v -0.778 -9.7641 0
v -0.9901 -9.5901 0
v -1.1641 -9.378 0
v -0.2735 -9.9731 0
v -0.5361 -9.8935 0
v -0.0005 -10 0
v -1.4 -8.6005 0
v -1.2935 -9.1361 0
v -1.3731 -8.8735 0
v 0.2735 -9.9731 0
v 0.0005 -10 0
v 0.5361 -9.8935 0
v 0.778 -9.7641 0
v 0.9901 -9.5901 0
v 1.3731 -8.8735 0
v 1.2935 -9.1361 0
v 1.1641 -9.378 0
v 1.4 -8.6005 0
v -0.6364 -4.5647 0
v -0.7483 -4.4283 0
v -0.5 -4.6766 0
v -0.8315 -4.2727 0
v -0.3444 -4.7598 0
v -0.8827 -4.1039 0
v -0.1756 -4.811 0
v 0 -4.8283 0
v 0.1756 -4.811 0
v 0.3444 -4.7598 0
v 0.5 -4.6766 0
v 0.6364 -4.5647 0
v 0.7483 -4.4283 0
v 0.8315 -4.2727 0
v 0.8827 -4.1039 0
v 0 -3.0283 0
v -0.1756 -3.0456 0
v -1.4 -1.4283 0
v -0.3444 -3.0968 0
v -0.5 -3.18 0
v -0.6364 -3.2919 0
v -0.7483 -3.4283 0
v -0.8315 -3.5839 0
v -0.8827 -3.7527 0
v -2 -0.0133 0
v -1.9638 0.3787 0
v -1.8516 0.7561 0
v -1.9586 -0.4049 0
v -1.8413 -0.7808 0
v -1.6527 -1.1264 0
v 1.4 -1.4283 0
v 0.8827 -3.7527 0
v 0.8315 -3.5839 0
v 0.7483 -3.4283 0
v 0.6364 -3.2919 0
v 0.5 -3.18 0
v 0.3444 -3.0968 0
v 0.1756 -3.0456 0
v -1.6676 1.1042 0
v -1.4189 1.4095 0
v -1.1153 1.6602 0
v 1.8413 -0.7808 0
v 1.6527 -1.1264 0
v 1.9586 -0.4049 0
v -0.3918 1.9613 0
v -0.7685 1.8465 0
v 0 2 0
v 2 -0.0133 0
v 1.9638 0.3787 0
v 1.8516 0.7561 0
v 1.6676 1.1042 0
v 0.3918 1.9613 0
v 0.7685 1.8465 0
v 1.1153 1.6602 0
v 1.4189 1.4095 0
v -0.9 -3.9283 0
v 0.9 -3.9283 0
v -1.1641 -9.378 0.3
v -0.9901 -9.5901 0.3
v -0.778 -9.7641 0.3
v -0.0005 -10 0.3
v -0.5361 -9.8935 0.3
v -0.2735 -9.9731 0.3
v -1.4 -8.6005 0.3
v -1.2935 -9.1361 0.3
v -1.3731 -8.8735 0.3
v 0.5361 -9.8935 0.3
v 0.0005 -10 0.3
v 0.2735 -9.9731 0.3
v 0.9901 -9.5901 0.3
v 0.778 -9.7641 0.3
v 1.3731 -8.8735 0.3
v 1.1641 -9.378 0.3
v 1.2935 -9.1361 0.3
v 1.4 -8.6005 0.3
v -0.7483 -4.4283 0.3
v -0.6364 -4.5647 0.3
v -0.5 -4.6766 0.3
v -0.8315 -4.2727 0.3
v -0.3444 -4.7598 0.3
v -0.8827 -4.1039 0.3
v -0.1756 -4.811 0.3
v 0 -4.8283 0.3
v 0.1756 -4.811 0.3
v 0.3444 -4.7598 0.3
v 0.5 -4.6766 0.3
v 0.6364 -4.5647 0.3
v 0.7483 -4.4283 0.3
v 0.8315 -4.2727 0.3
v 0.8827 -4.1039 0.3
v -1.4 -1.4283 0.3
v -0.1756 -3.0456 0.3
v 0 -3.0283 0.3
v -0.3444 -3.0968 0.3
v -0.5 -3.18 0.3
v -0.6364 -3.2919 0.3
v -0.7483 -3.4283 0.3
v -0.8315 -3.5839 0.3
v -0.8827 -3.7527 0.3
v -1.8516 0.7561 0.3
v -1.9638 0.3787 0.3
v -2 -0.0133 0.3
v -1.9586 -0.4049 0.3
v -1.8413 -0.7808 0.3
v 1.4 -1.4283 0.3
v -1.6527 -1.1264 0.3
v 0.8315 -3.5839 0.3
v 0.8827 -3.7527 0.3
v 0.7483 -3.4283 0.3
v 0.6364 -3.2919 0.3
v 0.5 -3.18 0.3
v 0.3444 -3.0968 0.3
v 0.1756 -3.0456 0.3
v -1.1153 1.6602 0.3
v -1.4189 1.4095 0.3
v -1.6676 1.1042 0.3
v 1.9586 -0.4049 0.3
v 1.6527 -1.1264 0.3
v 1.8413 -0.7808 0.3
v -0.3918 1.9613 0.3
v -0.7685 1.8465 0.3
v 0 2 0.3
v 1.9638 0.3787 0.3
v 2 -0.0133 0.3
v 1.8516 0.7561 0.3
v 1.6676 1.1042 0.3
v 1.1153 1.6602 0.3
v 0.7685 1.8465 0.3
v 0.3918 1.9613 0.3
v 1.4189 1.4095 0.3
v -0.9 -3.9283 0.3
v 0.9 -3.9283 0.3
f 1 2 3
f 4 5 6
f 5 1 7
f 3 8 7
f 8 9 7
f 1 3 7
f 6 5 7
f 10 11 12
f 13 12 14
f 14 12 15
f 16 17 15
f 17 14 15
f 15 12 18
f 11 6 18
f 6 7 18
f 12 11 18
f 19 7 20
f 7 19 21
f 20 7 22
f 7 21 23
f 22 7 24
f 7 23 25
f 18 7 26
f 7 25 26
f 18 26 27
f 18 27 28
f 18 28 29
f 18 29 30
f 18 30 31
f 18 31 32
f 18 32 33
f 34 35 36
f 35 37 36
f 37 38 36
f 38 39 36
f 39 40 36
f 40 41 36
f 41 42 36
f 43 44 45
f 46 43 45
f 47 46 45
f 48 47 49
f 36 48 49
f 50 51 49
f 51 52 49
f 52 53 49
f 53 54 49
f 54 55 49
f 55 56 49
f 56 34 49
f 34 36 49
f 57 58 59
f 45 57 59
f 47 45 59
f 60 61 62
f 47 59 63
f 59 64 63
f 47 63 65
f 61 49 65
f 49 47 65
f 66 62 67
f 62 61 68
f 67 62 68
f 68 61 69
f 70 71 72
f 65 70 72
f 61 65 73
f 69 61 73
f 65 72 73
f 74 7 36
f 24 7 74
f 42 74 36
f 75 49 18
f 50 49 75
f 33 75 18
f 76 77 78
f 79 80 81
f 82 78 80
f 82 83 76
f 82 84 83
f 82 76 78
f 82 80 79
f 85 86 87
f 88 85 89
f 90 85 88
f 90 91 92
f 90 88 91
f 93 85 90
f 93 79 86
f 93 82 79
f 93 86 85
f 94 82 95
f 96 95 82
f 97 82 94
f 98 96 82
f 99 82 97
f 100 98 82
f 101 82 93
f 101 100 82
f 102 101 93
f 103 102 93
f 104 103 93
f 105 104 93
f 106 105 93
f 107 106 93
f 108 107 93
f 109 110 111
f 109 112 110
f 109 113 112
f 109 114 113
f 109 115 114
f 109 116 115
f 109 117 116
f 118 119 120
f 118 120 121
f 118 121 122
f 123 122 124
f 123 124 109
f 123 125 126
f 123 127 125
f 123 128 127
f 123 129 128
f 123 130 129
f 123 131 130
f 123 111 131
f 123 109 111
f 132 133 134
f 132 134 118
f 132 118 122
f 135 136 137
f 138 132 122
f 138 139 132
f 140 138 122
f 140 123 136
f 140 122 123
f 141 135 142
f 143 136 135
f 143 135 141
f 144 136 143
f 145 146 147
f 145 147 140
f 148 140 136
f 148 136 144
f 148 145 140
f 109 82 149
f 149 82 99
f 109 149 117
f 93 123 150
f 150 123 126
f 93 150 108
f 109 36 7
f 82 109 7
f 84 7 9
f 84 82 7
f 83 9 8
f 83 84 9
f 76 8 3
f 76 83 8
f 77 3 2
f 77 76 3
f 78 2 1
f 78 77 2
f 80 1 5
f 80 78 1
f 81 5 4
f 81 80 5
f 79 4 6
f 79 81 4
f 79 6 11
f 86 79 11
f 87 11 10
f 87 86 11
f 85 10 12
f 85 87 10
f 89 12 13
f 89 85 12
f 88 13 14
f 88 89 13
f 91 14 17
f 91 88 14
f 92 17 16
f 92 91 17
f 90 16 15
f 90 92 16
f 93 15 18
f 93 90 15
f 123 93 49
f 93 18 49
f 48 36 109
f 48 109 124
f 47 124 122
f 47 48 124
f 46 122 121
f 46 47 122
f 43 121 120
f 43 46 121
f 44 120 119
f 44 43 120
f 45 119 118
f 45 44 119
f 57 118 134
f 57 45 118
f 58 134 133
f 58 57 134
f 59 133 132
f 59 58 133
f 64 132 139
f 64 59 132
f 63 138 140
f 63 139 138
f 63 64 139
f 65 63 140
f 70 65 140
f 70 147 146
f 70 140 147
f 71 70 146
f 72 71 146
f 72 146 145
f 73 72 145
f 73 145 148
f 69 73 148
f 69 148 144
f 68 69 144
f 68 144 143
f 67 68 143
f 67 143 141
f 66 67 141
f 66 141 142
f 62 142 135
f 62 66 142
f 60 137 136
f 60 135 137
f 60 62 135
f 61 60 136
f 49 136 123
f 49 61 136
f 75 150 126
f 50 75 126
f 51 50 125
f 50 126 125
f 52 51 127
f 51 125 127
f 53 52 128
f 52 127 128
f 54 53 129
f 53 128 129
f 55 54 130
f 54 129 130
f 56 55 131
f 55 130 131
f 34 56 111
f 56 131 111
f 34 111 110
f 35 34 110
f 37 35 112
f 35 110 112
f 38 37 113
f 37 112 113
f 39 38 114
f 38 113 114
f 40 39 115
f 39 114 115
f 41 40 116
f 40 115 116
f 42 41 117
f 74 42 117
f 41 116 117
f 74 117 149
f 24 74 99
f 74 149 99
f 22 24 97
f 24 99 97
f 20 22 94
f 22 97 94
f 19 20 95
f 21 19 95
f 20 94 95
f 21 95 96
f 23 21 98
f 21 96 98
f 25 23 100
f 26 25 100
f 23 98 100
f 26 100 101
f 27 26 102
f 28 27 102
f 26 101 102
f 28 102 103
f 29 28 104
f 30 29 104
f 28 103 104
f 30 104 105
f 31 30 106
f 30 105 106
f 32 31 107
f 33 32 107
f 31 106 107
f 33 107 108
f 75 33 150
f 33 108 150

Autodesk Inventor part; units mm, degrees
ref_plane "YZ Plane" through (0, 0, 0) normal (1, 0, 0) x (0, 1, 0)
ref_plane "XZ Plane" through (0, 0, 0) normal (0, 1, 0) x (-1, 0, 0)
ref_plane "XY Plane" through (0, 0, 0) normal (0, 0, 1) x (1, 0, 0)
sketch "Sketch1" plane through (0, 0, 0) normal (0, 0, 1) x (1, 0, 0)
  arc A0 (1.4, -1.4283) -> (-1.4, -1.4283) centre (0, 0) ccw
  line L0 (-1.4, -1.4283) -> (-1.4, -10)
  line L1 (-1.4, -10) -> (1.4, -10)
  line L2 (1.4, -10) -> (1.4, -1.4283)
  point P0 (0, -10)
  dimension "d0" = 4
  dimension "d1" = 2.8
  dimension "d2" = 12
extrude "Extrusion1" add sketch "Sketch1" along normal blind 0.3
fillet "Fillet1" radius 1.4 2 edges at (1.4, -10, 0.15) (-1.4, -10, 0.15)
sketch "Sketch2" plane through (0, 0, 0.3) normal (0, 0, 1) x (1, 0, 0)
  circle A0 centre (0, -3.9283) radius 0.9
  point P0 (1.4, -1.4283)
  dimension "d6" = 1.8
  dimension "d7" = 2.5
extrude "Extrusion2" cut sketch "Sketch2" against normal through all
properties material "Brass, Soft Yellow"
